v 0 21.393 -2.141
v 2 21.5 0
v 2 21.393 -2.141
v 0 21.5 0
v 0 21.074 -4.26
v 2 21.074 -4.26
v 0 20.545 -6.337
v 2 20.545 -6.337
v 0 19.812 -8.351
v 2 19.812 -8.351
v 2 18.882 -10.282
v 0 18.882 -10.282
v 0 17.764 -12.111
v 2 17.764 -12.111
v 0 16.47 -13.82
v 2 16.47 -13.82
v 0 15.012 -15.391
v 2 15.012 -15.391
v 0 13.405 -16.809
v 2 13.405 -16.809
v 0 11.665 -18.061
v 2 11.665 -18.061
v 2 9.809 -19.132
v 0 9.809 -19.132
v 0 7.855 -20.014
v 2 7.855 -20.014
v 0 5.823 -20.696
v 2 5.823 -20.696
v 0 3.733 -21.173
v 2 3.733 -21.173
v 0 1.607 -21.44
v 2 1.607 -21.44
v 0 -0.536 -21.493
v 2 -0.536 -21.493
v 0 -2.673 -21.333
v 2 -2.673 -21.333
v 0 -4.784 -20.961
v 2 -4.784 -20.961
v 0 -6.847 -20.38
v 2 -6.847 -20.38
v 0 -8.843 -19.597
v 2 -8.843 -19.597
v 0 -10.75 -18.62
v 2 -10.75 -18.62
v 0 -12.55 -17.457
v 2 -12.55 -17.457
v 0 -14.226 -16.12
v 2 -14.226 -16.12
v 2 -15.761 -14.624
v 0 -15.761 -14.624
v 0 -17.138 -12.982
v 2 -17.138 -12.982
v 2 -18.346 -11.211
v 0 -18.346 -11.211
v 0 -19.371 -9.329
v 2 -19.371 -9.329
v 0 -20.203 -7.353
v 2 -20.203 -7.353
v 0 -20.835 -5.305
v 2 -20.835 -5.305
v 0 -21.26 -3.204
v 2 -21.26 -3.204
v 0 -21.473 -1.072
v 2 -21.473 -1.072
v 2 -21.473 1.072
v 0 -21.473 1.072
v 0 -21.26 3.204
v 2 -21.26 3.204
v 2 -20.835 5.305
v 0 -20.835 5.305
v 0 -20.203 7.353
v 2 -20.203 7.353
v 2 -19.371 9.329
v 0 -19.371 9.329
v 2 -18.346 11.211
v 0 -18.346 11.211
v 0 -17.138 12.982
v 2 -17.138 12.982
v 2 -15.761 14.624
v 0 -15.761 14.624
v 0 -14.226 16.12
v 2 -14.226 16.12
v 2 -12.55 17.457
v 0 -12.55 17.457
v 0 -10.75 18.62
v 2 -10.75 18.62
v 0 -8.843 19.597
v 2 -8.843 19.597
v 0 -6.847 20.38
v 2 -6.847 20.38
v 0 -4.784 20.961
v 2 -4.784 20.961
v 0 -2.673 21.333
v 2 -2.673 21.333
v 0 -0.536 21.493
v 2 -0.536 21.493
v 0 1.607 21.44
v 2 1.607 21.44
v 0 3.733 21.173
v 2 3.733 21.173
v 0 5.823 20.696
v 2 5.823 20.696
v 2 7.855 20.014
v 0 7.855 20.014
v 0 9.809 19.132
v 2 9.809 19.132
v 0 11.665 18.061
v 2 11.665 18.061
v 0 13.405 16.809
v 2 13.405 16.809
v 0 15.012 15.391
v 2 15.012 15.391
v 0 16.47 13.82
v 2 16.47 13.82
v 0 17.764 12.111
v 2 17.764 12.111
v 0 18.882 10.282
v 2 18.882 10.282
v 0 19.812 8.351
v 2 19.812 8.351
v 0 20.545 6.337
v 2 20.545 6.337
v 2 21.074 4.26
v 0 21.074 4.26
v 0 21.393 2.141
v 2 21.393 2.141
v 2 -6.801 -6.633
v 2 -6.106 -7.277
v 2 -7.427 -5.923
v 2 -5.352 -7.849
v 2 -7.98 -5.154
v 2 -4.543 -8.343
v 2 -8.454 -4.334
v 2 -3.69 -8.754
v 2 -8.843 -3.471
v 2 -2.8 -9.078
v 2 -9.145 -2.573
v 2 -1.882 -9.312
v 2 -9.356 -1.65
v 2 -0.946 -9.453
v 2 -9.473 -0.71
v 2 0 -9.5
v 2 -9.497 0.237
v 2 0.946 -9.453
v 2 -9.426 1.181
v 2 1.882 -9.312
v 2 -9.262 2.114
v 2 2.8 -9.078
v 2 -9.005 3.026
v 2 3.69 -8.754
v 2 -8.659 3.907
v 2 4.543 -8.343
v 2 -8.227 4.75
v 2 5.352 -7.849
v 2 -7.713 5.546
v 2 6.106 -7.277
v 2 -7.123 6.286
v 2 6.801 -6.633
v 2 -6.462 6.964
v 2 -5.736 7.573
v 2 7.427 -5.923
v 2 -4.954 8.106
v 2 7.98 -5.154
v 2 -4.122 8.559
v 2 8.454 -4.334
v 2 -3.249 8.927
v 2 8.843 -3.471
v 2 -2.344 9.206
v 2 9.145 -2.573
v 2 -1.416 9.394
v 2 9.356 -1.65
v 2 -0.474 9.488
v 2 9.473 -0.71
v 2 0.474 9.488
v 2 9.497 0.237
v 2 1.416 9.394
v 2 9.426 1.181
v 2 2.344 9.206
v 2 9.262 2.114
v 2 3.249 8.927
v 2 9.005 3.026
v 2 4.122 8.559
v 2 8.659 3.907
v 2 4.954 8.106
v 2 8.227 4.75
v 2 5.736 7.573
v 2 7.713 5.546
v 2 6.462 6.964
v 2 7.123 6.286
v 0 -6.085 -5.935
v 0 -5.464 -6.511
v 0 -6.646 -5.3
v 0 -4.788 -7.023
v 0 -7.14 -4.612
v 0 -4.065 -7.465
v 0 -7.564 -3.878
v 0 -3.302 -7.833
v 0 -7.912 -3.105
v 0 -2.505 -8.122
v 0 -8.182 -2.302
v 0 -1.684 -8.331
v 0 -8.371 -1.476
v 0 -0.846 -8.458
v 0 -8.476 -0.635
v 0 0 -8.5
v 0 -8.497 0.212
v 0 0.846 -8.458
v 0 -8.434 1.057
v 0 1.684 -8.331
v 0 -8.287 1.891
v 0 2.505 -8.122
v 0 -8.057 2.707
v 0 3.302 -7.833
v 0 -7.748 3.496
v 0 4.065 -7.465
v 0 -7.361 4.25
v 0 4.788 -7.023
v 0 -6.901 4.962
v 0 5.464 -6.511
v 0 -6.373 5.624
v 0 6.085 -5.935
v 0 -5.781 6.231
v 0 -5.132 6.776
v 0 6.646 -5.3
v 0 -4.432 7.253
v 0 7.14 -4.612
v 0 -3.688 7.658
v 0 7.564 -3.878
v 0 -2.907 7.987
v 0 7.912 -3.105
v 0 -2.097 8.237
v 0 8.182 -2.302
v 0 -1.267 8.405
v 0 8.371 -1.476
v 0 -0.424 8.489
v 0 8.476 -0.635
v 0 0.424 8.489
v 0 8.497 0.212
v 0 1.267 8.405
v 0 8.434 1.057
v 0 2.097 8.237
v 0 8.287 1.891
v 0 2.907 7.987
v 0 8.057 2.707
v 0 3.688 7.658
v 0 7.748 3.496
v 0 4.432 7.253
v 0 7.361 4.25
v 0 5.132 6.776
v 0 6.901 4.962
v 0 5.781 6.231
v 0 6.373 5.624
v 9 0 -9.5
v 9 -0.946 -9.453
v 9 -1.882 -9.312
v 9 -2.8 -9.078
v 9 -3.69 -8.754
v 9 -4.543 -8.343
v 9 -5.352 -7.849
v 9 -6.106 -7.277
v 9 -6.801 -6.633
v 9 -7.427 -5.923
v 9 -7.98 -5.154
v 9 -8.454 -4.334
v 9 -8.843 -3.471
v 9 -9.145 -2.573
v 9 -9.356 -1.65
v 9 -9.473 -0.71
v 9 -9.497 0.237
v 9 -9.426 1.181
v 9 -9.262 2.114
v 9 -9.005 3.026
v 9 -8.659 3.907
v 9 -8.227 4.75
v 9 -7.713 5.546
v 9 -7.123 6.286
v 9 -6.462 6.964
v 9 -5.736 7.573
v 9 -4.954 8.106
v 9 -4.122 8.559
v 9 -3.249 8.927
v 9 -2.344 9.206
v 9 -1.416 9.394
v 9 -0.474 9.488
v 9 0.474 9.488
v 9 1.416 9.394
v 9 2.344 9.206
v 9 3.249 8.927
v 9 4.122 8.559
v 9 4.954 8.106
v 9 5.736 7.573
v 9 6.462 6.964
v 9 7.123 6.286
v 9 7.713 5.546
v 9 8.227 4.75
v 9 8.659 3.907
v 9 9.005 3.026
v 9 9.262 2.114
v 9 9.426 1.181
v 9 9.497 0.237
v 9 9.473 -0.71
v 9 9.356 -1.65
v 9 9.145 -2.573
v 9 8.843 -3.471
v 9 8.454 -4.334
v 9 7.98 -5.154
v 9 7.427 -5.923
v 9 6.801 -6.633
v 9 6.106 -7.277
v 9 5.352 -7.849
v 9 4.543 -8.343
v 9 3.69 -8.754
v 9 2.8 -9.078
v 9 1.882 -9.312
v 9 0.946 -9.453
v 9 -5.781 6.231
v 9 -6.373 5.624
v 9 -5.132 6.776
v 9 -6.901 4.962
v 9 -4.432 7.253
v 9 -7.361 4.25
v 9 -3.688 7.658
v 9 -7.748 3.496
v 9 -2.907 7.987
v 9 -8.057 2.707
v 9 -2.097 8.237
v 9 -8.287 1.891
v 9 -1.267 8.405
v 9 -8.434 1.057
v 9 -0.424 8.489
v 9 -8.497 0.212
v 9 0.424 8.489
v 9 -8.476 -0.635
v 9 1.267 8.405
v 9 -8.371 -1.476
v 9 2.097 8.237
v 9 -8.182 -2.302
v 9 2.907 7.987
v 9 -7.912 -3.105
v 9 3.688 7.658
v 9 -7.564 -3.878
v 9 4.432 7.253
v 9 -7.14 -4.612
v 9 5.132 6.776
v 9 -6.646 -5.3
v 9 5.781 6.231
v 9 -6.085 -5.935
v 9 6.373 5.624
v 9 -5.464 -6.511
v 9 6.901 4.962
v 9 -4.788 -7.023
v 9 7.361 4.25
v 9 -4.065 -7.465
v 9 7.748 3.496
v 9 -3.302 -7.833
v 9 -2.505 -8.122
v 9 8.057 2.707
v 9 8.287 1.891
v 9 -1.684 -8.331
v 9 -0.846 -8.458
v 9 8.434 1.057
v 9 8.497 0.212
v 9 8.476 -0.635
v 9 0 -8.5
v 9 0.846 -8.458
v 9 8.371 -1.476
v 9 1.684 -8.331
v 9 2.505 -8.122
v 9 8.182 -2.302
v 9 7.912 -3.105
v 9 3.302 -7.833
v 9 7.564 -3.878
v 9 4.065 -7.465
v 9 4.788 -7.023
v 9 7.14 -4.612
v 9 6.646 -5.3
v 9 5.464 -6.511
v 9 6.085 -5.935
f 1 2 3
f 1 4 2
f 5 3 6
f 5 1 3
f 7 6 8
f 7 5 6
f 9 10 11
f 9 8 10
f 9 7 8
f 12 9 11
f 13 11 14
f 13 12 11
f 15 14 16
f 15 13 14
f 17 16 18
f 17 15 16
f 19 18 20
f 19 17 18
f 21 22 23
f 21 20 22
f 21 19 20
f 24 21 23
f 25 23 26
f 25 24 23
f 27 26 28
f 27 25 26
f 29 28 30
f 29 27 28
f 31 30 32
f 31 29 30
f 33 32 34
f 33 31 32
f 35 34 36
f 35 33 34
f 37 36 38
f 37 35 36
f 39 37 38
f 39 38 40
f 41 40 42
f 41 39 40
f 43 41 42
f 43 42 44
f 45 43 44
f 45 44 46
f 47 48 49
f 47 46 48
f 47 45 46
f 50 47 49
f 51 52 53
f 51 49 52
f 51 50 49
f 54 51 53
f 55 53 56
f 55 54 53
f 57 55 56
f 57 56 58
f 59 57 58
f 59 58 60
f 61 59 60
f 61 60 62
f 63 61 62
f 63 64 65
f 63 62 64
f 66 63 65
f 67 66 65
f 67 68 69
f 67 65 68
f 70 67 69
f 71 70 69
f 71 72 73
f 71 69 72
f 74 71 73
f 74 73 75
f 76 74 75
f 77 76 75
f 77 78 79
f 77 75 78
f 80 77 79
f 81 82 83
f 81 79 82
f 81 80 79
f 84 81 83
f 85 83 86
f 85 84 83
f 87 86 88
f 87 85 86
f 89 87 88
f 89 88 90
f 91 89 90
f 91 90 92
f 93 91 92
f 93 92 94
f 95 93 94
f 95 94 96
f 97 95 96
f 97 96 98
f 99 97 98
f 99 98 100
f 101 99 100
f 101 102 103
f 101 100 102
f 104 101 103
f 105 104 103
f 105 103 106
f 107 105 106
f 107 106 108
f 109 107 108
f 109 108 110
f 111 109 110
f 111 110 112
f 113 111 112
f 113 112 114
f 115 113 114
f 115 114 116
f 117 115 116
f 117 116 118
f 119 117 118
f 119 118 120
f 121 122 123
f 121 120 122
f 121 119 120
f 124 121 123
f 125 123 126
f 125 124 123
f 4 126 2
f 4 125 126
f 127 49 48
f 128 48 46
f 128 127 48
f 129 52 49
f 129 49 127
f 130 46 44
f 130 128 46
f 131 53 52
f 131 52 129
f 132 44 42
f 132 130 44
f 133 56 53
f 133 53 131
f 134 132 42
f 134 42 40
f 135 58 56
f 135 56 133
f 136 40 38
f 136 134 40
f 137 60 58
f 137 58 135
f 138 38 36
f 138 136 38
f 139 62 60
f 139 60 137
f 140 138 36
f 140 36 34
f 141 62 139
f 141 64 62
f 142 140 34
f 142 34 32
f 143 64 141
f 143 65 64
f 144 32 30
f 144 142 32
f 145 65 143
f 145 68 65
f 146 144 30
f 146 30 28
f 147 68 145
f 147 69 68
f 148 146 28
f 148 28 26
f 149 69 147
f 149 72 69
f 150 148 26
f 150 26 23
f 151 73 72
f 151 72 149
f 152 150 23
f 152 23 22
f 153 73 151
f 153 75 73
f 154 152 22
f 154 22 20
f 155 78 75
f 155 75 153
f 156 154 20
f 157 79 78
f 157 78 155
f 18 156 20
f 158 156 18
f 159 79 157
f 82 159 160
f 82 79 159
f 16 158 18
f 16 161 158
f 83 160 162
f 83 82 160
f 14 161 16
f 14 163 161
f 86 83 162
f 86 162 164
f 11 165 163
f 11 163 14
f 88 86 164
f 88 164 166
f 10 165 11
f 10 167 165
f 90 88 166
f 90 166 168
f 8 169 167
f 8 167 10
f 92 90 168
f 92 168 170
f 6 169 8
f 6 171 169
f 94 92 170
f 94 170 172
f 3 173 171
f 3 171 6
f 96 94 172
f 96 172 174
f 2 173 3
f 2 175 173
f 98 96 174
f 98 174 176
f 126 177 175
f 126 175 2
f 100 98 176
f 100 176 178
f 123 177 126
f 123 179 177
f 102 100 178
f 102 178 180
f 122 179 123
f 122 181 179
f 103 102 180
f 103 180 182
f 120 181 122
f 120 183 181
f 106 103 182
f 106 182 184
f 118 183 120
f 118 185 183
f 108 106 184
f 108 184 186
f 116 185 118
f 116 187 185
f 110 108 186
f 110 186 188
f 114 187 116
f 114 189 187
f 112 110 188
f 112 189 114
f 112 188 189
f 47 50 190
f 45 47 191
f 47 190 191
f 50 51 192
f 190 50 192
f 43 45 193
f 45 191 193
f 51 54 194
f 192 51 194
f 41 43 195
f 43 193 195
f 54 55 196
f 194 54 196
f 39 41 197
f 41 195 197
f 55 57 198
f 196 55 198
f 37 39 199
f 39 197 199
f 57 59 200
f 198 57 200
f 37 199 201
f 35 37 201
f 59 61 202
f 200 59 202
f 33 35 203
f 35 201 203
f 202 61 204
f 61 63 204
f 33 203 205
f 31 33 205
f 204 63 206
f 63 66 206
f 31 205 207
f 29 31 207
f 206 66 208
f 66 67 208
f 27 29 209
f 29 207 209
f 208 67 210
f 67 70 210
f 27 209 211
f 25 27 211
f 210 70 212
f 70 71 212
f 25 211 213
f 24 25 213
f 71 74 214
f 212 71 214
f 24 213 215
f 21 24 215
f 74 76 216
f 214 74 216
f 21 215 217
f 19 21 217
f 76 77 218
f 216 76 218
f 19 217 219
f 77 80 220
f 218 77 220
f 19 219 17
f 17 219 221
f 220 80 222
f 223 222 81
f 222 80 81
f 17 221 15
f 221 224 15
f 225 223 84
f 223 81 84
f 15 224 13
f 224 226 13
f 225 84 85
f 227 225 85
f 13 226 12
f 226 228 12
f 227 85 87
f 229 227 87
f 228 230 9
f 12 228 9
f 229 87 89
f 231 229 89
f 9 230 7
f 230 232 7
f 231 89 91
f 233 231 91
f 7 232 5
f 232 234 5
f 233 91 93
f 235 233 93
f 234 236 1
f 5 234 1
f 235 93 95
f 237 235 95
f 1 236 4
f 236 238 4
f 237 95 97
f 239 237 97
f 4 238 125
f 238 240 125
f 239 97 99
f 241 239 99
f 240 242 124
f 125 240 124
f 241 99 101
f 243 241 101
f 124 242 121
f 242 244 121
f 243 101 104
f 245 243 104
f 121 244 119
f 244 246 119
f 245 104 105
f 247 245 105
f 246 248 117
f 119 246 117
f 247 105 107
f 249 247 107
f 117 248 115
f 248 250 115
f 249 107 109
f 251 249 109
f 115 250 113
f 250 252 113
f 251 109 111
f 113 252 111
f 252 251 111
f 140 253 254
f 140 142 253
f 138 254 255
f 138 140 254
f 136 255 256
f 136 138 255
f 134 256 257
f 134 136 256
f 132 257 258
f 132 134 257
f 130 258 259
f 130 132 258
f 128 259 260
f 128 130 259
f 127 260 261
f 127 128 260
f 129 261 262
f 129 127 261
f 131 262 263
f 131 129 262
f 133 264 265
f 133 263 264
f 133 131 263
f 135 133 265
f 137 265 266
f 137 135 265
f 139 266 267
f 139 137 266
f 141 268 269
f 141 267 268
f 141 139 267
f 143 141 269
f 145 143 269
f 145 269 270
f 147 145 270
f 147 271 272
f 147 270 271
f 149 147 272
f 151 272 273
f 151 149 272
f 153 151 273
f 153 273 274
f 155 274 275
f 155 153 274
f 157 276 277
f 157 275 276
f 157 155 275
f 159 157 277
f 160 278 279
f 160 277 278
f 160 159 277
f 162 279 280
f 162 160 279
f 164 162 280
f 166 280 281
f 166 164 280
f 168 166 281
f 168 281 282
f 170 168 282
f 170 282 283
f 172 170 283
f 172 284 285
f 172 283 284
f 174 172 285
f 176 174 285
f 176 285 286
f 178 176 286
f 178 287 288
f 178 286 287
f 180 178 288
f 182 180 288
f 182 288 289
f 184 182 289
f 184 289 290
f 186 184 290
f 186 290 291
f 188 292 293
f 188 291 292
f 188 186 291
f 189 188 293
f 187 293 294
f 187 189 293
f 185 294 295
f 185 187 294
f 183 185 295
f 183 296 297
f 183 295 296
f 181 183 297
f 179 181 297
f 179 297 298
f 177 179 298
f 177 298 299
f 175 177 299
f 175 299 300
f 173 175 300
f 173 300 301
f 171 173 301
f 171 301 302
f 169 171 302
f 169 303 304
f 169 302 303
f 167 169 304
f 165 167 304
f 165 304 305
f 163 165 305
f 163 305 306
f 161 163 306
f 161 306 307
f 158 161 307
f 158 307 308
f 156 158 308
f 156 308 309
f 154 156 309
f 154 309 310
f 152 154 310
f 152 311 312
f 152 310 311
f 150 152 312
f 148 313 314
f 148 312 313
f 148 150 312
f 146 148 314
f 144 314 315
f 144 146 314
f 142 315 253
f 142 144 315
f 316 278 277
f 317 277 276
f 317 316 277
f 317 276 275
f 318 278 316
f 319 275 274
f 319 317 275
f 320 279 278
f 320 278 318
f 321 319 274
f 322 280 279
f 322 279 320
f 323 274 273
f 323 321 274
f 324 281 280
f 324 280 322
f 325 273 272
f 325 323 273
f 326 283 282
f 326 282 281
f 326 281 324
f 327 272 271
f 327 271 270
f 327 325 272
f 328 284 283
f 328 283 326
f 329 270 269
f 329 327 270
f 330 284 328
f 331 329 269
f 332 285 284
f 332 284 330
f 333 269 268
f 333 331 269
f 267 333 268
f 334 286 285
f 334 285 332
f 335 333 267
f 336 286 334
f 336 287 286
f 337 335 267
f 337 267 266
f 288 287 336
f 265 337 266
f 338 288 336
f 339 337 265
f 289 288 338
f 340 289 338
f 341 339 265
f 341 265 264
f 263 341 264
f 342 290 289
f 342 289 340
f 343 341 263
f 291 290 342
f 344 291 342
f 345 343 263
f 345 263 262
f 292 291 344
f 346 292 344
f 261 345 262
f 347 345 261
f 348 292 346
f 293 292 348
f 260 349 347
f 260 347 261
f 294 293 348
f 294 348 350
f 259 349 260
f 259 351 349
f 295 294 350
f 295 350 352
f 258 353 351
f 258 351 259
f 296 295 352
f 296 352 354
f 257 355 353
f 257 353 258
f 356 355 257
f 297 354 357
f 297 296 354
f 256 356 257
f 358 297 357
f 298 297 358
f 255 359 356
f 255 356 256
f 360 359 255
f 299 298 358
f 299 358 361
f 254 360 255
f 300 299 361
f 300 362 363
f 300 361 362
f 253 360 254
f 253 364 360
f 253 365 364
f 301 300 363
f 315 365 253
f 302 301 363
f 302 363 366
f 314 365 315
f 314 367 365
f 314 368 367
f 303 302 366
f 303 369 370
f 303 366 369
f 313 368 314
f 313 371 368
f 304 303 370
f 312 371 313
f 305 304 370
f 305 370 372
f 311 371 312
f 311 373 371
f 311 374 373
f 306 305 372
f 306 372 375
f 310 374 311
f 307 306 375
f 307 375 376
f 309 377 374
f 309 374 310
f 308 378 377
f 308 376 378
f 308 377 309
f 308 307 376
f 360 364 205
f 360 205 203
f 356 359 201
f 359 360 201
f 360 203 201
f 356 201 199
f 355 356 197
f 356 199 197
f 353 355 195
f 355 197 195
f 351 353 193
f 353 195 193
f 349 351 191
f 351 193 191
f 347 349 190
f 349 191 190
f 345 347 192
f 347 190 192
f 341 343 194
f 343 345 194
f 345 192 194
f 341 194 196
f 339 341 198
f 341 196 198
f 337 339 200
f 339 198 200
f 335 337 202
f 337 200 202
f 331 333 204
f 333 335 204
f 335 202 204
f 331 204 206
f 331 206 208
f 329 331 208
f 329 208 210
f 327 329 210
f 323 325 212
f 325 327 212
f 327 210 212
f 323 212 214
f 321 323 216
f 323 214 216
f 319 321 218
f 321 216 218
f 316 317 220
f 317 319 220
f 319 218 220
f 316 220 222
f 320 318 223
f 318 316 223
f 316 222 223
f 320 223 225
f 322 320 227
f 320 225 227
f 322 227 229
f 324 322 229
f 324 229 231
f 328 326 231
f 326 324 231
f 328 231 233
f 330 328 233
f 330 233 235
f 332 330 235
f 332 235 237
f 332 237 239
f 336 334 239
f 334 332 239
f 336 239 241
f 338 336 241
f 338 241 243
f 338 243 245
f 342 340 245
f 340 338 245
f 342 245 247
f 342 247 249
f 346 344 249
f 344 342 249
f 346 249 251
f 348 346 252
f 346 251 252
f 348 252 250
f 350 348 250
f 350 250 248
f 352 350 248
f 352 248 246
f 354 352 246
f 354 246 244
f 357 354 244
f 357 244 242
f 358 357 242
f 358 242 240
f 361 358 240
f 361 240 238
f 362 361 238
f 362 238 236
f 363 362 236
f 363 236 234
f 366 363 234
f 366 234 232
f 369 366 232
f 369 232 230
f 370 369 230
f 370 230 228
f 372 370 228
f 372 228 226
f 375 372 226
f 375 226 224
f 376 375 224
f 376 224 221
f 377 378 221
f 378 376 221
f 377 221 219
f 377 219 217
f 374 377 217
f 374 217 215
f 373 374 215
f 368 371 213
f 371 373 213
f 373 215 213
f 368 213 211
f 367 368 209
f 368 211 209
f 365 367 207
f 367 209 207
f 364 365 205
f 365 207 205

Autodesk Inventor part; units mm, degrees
ref_plane "YZ Plane" through (0, 0, 0) normal (1, 0, 0) x (0, 1, 0)
ref_plane "XZ Plane" through (0, 0, 0) normal (0, 1, 0) x (-1, 0, 0)
ref_plane "XY Plane" through (0, 0, 0) normal (0, 0, 1) x (1, 0, 0)
sketch "Sketch2" plane through (0, 0, 0) normal (1, 0, 0) x (0, 1, 0)
  circle A0 centre (0, 0) radius 21.5
  dimension "d3" = 43
extrude "Extrusion1" add sketch "Sketch2" along normal blind 2
sketch "Sketch3" plane through (2, 0, 0) normal (1, 0, 0) x (0, 0, -1)
  circle A0 centre (0, 0) radius 21.5 projected
  circle A1 centre (0, 0) radius 8.5
  dimension "d6" = 17
extrude "Extrusion2" cut sketch "Sketch3" against normal blind 2 contours A1
sketch "Sketch4" plane through (2, 0, 0) normal (1, 0, 0) x (0, 0, -1)
  circle A0 centre (0, 0) radius 8.5 projected
  circle A1 centre (0, 0) radius 21.5 projected
  circle A2 centre (0, 0) radius 9.5
  dimension "d9" = 19
extrude "Extrusion3" add sketch "Sketch4" along normal blind 7 contours A2
properties part number "holeCoverP2"
